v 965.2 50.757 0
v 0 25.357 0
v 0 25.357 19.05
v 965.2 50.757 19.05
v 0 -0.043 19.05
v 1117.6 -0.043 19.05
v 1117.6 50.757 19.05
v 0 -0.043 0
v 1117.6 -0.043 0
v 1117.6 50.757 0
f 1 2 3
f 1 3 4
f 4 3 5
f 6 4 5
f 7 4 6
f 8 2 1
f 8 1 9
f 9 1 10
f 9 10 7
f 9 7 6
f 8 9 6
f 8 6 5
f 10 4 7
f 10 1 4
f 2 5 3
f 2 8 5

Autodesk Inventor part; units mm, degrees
ref_plane "YZ Plane" through (0, 0, 0) normal (1, 0, 0) x (0, 1, 0)
ref_plane "XZ Plane" through (0, 0, 0) normal (0, 1, 0) x (-1, 0, 0)
ref_plane "XY Plane" through (0, 0, 0) normal (0, 0, 1) x (1, 0, 0)
sketch "Sketch1" plane through (0, 0, 0) normal (0, 0, 1) x (1, 0, 0)
  line L0 (965.2, 50.7572) -> (1117.6, 50.7572)
  line L1 (1117.6, 50.7572) -> (1117.6, -0.0428)
  line L2 (1117.6, -0.0428) -> (0, -0.0428)
  line L3 (0, -0.0428) -> (0, 25.3572)
  line L4 (0, 25.3572) -> (965.2, 50.7572)
  point P0 (0, 0)
extrude "Extrusion1" add sketch "Sketch1" along normal blind 19.05
properties part number "nd-a"
